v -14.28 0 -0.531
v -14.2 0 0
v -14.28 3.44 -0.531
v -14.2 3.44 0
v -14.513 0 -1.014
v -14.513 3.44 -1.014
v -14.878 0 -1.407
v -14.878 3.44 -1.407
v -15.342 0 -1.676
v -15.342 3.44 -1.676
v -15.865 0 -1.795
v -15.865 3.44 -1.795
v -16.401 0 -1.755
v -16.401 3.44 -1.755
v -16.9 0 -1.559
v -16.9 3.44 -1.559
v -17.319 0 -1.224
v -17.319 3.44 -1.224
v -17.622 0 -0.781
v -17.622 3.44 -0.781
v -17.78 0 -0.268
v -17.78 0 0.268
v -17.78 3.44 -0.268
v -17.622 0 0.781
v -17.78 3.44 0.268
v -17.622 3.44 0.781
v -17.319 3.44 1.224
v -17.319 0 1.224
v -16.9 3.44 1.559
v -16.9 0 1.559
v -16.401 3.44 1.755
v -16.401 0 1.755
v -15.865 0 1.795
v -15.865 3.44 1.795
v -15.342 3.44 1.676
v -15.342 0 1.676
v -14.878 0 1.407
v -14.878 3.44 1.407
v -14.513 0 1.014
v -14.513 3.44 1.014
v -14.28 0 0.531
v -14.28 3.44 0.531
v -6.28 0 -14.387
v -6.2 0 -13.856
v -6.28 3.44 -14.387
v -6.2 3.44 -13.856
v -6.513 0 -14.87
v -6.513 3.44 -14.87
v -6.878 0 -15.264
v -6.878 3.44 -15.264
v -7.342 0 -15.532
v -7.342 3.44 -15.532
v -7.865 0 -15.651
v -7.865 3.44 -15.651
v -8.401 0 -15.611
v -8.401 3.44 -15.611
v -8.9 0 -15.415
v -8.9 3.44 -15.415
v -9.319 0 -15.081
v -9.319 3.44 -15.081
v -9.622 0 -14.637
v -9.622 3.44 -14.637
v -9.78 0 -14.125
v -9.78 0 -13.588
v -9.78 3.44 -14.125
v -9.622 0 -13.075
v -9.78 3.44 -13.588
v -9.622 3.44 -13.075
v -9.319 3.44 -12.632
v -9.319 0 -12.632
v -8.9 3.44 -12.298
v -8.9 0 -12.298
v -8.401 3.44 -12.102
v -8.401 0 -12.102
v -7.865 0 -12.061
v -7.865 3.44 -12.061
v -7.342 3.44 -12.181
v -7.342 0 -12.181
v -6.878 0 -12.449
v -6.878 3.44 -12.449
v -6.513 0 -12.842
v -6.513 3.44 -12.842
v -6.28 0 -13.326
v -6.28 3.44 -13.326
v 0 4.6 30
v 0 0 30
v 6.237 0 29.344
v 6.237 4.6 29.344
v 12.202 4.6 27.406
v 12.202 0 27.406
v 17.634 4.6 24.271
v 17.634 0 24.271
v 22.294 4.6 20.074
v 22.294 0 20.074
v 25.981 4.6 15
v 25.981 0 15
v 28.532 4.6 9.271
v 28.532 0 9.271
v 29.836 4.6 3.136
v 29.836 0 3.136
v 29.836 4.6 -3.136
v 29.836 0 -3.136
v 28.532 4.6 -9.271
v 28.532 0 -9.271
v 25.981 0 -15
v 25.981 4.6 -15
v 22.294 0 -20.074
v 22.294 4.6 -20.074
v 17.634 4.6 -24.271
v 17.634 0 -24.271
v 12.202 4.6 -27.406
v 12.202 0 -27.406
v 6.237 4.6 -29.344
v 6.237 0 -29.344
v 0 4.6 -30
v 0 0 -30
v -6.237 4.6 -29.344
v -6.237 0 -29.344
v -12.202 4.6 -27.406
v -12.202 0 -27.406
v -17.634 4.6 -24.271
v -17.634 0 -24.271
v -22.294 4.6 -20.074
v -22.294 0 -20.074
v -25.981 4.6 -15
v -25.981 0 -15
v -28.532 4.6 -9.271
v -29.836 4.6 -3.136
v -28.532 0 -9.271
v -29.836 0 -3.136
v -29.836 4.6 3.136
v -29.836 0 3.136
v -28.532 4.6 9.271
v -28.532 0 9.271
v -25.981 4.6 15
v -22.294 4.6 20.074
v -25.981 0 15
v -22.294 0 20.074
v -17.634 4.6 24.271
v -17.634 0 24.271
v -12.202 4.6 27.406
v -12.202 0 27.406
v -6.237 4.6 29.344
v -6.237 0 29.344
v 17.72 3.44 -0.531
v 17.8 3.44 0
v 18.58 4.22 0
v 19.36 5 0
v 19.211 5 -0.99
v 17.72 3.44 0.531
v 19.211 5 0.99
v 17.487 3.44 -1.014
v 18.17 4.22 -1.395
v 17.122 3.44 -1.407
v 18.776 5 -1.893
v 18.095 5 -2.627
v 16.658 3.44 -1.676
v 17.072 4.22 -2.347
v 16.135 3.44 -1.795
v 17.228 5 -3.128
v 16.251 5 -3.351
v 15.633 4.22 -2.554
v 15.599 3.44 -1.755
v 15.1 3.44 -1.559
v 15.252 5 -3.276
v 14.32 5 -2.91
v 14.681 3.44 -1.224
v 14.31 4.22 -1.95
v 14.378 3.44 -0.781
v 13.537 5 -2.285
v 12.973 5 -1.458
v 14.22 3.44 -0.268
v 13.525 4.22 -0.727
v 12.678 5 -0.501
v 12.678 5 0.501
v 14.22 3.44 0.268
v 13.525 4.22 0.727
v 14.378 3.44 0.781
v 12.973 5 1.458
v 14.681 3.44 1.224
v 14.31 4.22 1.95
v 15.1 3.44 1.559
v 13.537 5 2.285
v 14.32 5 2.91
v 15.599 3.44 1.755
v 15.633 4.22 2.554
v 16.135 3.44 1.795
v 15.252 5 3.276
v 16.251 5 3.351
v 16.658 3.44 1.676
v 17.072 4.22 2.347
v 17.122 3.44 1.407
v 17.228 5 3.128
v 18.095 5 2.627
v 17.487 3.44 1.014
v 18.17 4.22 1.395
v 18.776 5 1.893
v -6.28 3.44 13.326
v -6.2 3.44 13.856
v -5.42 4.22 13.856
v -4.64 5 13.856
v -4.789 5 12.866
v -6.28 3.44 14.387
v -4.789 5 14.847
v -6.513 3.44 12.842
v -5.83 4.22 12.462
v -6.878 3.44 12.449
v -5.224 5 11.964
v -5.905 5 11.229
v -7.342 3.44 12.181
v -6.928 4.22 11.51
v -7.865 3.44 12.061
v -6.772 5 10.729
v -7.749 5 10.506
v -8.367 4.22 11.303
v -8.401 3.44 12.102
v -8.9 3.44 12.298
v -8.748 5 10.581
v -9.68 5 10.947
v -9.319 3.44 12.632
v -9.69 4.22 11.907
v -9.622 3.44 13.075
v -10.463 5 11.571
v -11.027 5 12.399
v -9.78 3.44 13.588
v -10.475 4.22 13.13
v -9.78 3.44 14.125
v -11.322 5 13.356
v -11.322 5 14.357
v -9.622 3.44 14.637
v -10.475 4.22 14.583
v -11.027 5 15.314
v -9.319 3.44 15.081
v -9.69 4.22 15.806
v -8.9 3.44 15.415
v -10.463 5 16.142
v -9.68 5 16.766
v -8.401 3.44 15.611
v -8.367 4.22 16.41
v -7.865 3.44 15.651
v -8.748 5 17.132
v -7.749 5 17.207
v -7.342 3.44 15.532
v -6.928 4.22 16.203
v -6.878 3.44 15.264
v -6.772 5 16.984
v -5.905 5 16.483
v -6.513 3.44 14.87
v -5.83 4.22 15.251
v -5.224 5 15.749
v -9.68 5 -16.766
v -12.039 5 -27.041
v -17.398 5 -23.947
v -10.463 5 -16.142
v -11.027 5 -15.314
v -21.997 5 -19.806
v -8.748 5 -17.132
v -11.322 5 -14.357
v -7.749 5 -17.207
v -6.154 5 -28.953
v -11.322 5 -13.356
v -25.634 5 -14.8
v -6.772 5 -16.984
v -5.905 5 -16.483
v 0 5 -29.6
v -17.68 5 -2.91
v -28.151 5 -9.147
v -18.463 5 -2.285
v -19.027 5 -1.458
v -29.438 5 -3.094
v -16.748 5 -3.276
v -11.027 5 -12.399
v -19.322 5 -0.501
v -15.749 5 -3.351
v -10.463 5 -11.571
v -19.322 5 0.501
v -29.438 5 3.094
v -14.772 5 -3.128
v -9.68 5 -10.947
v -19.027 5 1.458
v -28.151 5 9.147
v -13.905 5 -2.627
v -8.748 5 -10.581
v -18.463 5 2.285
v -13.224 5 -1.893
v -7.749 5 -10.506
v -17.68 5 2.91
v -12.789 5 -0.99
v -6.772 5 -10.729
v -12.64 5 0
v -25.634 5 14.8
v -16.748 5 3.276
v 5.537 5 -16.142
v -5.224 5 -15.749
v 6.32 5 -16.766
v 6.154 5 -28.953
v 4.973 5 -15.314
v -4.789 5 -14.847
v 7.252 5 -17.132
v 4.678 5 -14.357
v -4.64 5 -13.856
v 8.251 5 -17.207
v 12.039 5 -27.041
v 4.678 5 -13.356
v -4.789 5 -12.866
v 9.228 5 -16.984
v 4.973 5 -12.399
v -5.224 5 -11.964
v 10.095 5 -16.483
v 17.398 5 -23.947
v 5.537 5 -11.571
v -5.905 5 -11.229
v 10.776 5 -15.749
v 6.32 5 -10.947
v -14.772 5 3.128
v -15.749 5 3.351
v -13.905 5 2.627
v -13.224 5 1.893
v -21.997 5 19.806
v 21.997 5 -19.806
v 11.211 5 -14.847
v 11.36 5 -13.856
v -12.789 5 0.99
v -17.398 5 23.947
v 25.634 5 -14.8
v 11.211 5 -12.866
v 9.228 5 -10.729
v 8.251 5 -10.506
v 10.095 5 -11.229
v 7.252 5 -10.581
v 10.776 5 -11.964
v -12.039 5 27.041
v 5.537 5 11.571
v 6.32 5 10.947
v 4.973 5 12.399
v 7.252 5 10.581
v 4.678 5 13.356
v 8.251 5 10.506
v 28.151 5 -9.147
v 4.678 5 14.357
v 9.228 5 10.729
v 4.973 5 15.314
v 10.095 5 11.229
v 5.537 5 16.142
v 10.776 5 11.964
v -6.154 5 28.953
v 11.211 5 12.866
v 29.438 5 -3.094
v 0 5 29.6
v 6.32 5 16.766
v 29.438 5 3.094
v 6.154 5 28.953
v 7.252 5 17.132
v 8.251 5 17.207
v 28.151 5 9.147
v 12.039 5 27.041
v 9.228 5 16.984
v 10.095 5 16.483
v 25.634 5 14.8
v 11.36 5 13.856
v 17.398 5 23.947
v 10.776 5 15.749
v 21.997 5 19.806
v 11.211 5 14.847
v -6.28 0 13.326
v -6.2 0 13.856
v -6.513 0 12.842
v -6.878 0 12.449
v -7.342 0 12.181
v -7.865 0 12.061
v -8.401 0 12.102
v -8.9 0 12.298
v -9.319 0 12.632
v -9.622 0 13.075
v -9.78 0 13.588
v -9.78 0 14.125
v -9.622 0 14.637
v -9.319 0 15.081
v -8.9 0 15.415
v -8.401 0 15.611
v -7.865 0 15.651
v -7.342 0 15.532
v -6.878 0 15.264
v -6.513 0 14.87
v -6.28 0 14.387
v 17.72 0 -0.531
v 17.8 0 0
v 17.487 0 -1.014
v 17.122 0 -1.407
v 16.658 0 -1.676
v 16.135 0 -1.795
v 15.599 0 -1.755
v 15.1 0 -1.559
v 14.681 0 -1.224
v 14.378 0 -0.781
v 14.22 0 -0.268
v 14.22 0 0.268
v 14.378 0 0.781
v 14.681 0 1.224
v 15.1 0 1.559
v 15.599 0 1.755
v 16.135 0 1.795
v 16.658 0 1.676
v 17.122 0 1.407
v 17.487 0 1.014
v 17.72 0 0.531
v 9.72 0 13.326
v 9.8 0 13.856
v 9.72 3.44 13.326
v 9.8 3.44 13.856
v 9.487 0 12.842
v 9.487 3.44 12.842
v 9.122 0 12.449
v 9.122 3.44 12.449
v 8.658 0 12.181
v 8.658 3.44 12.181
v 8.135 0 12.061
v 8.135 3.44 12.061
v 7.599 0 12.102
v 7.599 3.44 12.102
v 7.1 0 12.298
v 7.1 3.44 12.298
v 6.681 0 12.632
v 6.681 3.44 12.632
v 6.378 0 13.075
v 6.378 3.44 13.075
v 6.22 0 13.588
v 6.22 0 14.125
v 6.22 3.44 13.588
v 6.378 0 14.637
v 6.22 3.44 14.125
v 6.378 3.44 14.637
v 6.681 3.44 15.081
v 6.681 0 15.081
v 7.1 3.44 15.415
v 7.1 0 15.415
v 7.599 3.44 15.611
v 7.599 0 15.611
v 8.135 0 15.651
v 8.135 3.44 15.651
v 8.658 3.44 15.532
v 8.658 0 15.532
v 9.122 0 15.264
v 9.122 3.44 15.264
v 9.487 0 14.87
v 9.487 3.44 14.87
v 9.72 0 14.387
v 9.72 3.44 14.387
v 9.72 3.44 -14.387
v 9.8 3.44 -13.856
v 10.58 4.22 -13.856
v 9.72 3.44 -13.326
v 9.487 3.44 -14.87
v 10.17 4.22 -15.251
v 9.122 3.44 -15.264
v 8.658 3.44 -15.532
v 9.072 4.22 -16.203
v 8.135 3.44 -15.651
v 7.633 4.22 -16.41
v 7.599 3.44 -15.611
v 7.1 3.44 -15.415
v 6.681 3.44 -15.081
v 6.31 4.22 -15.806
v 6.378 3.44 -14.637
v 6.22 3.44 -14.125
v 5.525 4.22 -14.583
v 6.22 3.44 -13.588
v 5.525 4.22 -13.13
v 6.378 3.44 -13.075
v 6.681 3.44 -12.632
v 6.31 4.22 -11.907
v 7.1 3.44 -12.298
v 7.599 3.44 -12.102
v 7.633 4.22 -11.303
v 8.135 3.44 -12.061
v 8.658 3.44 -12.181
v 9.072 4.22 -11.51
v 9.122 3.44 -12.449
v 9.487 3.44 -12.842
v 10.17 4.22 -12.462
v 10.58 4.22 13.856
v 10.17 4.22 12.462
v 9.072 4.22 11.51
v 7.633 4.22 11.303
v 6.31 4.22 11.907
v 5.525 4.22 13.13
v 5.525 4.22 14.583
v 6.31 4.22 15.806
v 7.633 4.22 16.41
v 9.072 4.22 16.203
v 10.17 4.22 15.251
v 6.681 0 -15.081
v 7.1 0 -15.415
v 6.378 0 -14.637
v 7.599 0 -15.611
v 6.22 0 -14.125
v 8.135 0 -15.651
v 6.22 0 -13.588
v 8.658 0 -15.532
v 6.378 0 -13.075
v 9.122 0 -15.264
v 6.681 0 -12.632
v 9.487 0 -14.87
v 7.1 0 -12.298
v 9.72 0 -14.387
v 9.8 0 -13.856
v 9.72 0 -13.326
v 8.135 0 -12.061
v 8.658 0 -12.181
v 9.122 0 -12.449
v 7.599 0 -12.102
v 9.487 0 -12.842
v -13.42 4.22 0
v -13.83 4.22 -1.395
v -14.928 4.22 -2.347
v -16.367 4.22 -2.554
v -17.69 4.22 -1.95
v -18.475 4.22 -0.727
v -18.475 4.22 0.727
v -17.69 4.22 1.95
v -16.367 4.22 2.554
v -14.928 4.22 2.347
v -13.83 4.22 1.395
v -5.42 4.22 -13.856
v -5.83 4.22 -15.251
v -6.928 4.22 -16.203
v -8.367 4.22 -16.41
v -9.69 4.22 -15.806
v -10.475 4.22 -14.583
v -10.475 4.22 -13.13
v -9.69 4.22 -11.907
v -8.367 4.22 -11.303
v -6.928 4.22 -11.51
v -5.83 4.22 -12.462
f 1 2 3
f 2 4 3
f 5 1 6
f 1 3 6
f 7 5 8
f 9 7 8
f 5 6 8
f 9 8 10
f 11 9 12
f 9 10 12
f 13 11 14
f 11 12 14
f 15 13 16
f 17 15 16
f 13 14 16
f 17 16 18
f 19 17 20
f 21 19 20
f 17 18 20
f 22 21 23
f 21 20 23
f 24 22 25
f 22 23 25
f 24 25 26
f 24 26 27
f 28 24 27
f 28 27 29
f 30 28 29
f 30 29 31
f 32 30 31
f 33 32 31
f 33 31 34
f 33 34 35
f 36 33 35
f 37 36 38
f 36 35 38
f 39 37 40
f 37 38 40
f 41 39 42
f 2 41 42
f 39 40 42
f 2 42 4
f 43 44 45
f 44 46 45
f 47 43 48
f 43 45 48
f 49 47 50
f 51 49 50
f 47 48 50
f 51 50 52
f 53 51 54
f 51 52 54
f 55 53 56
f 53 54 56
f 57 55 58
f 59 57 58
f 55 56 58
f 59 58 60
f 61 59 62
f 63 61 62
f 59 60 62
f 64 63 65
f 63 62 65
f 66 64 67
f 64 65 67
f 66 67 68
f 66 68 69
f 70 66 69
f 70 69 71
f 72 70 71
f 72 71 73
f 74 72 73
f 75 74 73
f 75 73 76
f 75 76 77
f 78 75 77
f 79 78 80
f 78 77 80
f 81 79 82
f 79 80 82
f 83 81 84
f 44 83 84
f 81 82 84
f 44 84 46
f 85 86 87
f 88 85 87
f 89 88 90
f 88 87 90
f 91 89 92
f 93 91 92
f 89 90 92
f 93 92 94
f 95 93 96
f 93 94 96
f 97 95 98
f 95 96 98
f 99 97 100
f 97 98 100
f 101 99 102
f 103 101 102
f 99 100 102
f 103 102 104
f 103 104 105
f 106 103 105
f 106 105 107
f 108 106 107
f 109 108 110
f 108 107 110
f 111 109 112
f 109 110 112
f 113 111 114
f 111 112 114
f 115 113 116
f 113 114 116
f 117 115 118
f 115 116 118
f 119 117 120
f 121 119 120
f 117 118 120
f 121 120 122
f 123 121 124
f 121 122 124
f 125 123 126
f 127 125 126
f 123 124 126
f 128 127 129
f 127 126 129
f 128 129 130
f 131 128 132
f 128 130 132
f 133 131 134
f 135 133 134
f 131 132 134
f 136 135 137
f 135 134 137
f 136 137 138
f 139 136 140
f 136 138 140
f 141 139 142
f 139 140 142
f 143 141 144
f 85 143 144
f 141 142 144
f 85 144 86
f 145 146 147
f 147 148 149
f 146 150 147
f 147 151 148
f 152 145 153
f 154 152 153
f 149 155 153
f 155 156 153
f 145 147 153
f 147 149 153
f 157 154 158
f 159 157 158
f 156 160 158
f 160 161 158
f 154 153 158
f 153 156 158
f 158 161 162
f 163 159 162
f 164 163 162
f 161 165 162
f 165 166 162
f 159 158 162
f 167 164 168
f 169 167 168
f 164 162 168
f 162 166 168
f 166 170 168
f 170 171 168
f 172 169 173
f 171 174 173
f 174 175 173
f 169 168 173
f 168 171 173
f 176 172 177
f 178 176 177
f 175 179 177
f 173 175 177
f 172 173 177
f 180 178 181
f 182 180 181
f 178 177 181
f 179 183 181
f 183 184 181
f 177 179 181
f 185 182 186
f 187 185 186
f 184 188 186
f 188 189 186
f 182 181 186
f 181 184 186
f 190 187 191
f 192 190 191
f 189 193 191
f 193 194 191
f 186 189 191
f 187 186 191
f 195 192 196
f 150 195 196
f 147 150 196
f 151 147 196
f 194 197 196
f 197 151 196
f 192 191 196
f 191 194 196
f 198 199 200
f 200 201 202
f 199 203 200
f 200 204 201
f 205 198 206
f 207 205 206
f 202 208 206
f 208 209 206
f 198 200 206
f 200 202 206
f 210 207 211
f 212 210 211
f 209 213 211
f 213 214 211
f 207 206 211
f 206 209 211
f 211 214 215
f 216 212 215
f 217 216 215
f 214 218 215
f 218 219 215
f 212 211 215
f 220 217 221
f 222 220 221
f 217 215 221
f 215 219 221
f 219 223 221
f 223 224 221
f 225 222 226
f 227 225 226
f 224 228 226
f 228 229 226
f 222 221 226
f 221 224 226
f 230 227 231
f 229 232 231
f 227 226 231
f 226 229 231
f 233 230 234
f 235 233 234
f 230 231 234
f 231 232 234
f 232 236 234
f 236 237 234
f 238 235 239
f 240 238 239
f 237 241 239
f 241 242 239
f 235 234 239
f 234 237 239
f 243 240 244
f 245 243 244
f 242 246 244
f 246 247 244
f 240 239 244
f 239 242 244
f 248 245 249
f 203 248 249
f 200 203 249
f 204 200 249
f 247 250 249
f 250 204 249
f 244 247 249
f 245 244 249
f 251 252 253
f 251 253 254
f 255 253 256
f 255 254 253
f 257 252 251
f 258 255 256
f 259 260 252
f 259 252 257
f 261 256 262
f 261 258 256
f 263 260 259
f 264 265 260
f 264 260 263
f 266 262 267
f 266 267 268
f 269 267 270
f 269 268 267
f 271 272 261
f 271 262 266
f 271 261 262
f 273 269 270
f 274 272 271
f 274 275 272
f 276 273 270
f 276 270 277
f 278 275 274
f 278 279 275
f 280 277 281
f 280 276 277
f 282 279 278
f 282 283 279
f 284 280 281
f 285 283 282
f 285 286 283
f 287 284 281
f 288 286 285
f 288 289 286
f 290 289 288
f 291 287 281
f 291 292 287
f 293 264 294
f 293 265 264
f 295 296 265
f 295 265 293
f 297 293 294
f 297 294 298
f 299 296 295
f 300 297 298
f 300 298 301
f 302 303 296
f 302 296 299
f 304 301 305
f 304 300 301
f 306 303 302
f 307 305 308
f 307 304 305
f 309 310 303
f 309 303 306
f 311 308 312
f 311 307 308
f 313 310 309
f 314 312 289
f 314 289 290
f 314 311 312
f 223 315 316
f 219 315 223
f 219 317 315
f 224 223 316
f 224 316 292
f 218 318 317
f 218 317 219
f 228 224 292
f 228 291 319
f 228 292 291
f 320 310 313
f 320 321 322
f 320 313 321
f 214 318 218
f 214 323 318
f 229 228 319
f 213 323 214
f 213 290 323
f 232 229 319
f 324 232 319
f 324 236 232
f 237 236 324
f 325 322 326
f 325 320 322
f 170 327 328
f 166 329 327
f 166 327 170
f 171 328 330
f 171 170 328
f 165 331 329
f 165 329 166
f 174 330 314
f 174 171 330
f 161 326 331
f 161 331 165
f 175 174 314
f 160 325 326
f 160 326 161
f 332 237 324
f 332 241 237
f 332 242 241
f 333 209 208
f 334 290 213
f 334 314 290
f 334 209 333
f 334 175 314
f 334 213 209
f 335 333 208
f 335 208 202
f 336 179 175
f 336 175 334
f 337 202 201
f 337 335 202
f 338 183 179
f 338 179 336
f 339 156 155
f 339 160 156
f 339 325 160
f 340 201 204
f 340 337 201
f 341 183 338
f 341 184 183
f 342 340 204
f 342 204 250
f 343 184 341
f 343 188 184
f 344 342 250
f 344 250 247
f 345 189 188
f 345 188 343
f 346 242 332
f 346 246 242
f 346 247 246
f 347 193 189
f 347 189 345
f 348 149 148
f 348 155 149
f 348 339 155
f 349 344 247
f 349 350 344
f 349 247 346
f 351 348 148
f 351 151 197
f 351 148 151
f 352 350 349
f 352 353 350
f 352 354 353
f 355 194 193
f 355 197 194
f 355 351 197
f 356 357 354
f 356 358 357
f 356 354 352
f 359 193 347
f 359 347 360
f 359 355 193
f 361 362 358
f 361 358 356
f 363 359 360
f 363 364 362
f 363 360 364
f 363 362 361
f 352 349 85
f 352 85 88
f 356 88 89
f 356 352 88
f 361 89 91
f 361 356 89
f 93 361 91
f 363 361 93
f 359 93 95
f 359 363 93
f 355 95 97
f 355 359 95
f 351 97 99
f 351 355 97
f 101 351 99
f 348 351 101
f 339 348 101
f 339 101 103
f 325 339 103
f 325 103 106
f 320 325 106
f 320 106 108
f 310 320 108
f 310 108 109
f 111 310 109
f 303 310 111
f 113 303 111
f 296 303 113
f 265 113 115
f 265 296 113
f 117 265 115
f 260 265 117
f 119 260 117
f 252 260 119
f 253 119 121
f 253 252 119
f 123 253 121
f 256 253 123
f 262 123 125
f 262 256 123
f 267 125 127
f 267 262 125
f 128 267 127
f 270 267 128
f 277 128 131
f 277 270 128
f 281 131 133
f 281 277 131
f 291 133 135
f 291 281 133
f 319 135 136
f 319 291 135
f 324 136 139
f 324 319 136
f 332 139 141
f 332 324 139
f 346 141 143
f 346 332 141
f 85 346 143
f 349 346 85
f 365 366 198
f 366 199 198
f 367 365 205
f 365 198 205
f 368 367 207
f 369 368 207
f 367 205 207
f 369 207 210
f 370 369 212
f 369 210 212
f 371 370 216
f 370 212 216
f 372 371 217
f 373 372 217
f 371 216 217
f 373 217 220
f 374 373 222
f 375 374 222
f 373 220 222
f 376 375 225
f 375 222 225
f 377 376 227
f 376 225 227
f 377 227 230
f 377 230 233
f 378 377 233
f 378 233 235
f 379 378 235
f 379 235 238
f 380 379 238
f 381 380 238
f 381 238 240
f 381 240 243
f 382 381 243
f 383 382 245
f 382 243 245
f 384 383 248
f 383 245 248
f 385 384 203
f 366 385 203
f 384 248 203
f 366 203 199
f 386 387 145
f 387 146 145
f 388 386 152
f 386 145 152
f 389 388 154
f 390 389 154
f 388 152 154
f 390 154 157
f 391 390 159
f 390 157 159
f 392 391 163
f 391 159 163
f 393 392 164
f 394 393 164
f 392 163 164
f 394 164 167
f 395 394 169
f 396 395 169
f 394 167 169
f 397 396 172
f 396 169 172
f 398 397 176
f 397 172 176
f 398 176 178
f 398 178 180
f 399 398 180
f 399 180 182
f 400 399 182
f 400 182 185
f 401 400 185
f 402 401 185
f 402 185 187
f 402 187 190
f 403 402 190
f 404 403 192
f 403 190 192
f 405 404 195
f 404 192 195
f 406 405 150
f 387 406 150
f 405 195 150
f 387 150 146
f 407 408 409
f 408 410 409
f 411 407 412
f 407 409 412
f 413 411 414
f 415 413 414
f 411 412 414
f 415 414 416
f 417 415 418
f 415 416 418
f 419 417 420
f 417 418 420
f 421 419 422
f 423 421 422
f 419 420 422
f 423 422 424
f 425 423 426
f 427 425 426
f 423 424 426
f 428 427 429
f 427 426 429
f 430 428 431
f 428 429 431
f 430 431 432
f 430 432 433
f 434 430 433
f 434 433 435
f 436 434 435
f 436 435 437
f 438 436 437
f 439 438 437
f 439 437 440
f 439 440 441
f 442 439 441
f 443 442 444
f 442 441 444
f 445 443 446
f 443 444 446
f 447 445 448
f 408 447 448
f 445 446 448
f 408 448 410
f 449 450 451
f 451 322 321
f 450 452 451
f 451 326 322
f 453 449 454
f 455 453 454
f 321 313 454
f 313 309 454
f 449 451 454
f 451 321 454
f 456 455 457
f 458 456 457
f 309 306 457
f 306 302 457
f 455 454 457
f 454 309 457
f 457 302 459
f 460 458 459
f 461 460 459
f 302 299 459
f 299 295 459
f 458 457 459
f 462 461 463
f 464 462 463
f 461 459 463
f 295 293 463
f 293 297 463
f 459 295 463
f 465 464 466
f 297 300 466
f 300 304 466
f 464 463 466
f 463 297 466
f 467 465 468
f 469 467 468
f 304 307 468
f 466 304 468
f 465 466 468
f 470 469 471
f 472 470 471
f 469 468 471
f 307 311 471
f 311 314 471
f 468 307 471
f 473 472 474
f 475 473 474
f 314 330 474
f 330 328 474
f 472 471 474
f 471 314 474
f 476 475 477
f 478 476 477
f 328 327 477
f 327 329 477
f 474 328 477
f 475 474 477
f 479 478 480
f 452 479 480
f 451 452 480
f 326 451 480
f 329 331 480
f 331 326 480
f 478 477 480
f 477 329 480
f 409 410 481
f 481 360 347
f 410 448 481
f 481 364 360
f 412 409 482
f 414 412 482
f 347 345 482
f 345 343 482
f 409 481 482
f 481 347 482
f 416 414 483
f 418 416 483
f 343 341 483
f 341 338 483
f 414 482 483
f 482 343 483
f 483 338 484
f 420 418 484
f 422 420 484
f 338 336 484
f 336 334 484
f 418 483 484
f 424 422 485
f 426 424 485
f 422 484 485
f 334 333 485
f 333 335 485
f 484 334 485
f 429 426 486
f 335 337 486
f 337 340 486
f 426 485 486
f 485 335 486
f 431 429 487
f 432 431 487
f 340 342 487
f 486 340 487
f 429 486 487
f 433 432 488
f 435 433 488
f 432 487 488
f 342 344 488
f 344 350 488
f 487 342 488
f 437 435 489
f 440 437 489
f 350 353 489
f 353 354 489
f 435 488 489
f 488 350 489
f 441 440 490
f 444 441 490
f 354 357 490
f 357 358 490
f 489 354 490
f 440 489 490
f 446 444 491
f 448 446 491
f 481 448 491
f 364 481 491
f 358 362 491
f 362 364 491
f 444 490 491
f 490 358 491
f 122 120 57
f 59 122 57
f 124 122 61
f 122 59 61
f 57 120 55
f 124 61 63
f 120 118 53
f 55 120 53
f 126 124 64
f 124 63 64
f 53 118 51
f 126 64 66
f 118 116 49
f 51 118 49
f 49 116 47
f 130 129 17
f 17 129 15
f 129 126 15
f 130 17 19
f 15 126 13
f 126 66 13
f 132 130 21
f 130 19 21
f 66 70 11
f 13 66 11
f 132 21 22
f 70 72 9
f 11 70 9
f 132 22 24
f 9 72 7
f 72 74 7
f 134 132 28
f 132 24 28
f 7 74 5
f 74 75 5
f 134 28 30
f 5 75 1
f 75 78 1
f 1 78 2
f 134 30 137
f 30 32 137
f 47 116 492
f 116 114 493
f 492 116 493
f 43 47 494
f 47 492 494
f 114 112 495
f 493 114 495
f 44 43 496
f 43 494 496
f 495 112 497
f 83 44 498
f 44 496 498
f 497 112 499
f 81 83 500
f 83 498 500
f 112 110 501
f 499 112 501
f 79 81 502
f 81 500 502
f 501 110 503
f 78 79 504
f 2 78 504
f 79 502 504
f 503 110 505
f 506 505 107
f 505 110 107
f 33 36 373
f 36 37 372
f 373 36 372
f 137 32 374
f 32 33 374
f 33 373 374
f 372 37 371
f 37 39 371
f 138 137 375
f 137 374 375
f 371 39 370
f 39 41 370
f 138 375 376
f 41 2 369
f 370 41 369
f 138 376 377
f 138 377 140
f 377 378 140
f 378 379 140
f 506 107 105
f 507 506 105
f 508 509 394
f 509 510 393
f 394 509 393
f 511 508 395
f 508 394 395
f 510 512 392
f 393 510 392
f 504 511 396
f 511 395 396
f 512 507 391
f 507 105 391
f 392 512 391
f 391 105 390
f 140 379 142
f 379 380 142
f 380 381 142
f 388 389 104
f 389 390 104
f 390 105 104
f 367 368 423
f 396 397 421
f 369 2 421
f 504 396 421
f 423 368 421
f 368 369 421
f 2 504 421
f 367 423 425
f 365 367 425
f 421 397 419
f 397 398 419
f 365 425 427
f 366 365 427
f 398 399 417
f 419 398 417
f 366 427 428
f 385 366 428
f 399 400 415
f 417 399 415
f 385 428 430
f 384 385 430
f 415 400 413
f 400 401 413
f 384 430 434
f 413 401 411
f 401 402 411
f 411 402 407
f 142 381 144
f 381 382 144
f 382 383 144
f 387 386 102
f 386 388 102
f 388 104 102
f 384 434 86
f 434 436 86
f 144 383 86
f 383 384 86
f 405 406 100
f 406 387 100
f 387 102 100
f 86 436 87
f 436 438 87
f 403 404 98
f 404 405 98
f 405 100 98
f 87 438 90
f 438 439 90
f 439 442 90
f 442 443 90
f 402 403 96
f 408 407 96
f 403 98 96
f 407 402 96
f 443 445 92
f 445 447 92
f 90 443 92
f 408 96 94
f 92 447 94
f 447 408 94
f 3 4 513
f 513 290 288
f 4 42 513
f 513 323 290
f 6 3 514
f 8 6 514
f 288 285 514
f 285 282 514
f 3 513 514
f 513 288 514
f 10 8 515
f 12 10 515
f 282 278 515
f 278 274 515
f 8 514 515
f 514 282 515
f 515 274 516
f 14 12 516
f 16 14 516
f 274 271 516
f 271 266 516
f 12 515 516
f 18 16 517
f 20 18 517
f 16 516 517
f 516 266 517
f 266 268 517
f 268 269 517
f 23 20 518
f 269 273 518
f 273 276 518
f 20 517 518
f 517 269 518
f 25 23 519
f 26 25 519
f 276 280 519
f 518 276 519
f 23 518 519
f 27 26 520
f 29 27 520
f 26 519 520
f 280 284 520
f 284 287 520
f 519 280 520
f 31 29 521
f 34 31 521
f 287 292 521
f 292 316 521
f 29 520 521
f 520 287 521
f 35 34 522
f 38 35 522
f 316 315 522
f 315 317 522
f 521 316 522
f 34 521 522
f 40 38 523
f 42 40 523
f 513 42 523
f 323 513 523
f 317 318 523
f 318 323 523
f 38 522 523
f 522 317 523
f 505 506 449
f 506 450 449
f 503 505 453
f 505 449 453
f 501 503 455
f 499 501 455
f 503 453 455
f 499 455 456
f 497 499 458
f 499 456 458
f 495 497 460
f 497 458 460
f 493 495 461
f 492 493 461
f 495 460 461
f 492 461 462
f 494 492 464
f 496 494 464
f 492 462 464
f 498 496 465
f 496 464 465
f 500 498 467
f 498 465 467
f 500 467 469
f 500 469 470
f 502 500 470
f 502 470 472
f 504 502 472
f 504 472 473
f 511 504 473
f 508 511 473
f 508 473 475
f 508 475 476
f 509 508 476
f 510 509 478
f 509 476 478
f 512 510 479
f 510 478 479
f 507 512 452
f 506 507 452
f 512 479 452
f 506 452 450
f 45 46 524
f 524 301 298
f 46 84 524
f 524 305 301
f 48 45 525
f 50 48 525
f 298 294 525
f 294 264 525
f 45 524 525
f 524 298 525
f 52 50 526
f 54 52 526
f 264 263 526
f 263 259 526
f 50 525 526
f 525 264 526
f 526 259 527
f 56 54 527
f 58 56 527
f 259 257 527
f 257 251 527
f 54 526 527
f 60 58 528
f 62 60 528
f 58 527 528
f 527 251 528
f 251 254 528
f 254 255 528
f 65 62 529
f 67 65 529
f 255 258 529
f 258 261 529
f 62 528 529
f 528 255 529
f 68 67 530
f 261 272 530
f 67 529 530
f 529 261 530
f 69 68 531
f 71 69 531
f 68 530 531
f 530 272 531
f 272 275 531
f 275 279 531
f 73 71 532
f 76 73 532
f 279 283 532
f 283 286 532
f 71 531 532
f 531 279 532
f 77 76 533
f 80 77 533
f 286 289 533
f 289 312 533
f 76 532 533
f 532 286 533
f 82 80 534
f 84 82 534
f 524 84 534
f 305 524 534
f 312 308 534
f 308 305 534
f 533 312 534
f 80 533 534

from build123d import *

# Parameters (mm, degrees)
SKETCH1_R           = 30
BOSS_EXTRUDE1_DEPTH = 5
CHAMFER1_SIZE       = 0.4


# Read off the part's stored shape, not the designer's step: CSK for M3 Hex Socket Countersunk Cap Screw1
with BuildPart() as part:
    # Sketch1 → Boss-Extrude1 (new body)
    with BuildSketch(Plane(origin=(0, 0, 0), x_dir=(1, 0, 0), z_dir=(0, 1, 0))):
        with Locations(Location((0, 0, 0), (0, 0, 270))):
            Circle(SKETCH1_R)
    extrude(amount=BOSS_EXTRUDE1_DEPTH)

    # CSK for M3 Hex Socket Countersunk Ca 2 → CSK for M3 Hex Socket Countersunk Cap Screw1 (revolve, cut)
    with BuildSketch(Plane(origin=(8, 0, 13.856406461), x_dir=(1, 0, 0), z_dir=(0, 0, 1))):
        Polygon((0, 0), (1.8, 0), (1.8, 3.44), (3.36, 5), (0, 5), align=None)
    revolve(axis=Axis((8, 0, 13.856406461), (0, 1, 0)), mode=Mode.SUBTRACT)

    # CSK for M3 Hex Socket Countersunk Ca 3 o → CSK for M3 Hex Socket Countersunk Ca 3 (revolve, cut)
    with BuildSketch(Plane(origin=(-8, 0, 13.856406461), x_dir=(1, 0, 0), z_dir=(0, 0, 1))):
        Polygon((0, 0), (1.8, 0), (1.8, 3.44), (3.36, 5), (0, 5), align=None)
    revolve(axis=Axis((-8, 0, 13.856406461), (0, 1, 0)), mode=Mode.SUBTRACT)

    # CSK for M3 Hex Socket Countersunk Ca 4 o → CSK for M3 Hex Socket Countersunk Ca 4 (revolve, cut)
    with BuildSketch(Plane(origin=(-16, 0, 0), x_dir=(1, 0, 0), z_dir=(0, 0, 1))):
        Polygon((0, 0), (1.8, 0), (1.8, 3.44), (3.36, 5), (0, 5), align=None)
    revolve(axis=Axis((-16, 0, 0), (0, 1, 0)), mode=Mode.SUBTRACT)

    # CSK for M3 Hex Socket Countersunk Ca 5 o → CSK for M3 Hex Socket Countersunk Ca 5 (revolve, cut)
    with BuildSketch(Plane(origin=(-8, 0, -13.856406461), x_dir=(1, 0, 0), z_dir=(0, 0, 1))):
        Polygon((0, 0), (1.8, 0), (1.8, 3.44), (3.36, 5), (0, 5), align=None)
    revolve(axis=Axis((-8, 0, -13.856406461), (0, 1, 0)), mode=Mode.SUBTRACT)

    # CSK for M3 Hex Socket Countersunk Ca 6 o → CSK for M3 Hex Socket Countersunk Ca 6 (revolve, cut)
    with BuildSketch(Plane(origin=(8, 0, -13.856406461), x_dir=(1, 0, 0), z_dir=(0, 0, 1))):
        Polygon((0, 0), (1.8, 0), (1.8, 3.44), (3.36, 5), (0, 5), align=None)
    revolve(axis=Axis((8, 0, -13.856406461), (0, 1, 0)), mode=Mode.SUBTRACT)

    # CSK for M3 Hex Socket Countersunk Ca 7 o → CSK for M3 Hex Socket Countersunk Ca 7 (revolve, cut)
    with BuildSketch(Plane(origin=(16, 0, 0), x_dir=(1, 0, 0), z_dir=(0, 0, 1))):
        Polygon((0, 0), (1.8, 0), (1.8, 3.44), (3.36, 5), (0, 5), align=None)
    revolve(axis=Axis((16, 0, 0), (0, 1, 0)), mode=Mode.SUBTRACT)

    # Chamfer1
    chamfer1_edges = [part.edges().sort_by_distance(p)[0] for p in [
        (0, 5, -30),
    ]]
    chamfer(chamfer1_edges, length=CHAMFER1_SIZE)


solid = part.part
